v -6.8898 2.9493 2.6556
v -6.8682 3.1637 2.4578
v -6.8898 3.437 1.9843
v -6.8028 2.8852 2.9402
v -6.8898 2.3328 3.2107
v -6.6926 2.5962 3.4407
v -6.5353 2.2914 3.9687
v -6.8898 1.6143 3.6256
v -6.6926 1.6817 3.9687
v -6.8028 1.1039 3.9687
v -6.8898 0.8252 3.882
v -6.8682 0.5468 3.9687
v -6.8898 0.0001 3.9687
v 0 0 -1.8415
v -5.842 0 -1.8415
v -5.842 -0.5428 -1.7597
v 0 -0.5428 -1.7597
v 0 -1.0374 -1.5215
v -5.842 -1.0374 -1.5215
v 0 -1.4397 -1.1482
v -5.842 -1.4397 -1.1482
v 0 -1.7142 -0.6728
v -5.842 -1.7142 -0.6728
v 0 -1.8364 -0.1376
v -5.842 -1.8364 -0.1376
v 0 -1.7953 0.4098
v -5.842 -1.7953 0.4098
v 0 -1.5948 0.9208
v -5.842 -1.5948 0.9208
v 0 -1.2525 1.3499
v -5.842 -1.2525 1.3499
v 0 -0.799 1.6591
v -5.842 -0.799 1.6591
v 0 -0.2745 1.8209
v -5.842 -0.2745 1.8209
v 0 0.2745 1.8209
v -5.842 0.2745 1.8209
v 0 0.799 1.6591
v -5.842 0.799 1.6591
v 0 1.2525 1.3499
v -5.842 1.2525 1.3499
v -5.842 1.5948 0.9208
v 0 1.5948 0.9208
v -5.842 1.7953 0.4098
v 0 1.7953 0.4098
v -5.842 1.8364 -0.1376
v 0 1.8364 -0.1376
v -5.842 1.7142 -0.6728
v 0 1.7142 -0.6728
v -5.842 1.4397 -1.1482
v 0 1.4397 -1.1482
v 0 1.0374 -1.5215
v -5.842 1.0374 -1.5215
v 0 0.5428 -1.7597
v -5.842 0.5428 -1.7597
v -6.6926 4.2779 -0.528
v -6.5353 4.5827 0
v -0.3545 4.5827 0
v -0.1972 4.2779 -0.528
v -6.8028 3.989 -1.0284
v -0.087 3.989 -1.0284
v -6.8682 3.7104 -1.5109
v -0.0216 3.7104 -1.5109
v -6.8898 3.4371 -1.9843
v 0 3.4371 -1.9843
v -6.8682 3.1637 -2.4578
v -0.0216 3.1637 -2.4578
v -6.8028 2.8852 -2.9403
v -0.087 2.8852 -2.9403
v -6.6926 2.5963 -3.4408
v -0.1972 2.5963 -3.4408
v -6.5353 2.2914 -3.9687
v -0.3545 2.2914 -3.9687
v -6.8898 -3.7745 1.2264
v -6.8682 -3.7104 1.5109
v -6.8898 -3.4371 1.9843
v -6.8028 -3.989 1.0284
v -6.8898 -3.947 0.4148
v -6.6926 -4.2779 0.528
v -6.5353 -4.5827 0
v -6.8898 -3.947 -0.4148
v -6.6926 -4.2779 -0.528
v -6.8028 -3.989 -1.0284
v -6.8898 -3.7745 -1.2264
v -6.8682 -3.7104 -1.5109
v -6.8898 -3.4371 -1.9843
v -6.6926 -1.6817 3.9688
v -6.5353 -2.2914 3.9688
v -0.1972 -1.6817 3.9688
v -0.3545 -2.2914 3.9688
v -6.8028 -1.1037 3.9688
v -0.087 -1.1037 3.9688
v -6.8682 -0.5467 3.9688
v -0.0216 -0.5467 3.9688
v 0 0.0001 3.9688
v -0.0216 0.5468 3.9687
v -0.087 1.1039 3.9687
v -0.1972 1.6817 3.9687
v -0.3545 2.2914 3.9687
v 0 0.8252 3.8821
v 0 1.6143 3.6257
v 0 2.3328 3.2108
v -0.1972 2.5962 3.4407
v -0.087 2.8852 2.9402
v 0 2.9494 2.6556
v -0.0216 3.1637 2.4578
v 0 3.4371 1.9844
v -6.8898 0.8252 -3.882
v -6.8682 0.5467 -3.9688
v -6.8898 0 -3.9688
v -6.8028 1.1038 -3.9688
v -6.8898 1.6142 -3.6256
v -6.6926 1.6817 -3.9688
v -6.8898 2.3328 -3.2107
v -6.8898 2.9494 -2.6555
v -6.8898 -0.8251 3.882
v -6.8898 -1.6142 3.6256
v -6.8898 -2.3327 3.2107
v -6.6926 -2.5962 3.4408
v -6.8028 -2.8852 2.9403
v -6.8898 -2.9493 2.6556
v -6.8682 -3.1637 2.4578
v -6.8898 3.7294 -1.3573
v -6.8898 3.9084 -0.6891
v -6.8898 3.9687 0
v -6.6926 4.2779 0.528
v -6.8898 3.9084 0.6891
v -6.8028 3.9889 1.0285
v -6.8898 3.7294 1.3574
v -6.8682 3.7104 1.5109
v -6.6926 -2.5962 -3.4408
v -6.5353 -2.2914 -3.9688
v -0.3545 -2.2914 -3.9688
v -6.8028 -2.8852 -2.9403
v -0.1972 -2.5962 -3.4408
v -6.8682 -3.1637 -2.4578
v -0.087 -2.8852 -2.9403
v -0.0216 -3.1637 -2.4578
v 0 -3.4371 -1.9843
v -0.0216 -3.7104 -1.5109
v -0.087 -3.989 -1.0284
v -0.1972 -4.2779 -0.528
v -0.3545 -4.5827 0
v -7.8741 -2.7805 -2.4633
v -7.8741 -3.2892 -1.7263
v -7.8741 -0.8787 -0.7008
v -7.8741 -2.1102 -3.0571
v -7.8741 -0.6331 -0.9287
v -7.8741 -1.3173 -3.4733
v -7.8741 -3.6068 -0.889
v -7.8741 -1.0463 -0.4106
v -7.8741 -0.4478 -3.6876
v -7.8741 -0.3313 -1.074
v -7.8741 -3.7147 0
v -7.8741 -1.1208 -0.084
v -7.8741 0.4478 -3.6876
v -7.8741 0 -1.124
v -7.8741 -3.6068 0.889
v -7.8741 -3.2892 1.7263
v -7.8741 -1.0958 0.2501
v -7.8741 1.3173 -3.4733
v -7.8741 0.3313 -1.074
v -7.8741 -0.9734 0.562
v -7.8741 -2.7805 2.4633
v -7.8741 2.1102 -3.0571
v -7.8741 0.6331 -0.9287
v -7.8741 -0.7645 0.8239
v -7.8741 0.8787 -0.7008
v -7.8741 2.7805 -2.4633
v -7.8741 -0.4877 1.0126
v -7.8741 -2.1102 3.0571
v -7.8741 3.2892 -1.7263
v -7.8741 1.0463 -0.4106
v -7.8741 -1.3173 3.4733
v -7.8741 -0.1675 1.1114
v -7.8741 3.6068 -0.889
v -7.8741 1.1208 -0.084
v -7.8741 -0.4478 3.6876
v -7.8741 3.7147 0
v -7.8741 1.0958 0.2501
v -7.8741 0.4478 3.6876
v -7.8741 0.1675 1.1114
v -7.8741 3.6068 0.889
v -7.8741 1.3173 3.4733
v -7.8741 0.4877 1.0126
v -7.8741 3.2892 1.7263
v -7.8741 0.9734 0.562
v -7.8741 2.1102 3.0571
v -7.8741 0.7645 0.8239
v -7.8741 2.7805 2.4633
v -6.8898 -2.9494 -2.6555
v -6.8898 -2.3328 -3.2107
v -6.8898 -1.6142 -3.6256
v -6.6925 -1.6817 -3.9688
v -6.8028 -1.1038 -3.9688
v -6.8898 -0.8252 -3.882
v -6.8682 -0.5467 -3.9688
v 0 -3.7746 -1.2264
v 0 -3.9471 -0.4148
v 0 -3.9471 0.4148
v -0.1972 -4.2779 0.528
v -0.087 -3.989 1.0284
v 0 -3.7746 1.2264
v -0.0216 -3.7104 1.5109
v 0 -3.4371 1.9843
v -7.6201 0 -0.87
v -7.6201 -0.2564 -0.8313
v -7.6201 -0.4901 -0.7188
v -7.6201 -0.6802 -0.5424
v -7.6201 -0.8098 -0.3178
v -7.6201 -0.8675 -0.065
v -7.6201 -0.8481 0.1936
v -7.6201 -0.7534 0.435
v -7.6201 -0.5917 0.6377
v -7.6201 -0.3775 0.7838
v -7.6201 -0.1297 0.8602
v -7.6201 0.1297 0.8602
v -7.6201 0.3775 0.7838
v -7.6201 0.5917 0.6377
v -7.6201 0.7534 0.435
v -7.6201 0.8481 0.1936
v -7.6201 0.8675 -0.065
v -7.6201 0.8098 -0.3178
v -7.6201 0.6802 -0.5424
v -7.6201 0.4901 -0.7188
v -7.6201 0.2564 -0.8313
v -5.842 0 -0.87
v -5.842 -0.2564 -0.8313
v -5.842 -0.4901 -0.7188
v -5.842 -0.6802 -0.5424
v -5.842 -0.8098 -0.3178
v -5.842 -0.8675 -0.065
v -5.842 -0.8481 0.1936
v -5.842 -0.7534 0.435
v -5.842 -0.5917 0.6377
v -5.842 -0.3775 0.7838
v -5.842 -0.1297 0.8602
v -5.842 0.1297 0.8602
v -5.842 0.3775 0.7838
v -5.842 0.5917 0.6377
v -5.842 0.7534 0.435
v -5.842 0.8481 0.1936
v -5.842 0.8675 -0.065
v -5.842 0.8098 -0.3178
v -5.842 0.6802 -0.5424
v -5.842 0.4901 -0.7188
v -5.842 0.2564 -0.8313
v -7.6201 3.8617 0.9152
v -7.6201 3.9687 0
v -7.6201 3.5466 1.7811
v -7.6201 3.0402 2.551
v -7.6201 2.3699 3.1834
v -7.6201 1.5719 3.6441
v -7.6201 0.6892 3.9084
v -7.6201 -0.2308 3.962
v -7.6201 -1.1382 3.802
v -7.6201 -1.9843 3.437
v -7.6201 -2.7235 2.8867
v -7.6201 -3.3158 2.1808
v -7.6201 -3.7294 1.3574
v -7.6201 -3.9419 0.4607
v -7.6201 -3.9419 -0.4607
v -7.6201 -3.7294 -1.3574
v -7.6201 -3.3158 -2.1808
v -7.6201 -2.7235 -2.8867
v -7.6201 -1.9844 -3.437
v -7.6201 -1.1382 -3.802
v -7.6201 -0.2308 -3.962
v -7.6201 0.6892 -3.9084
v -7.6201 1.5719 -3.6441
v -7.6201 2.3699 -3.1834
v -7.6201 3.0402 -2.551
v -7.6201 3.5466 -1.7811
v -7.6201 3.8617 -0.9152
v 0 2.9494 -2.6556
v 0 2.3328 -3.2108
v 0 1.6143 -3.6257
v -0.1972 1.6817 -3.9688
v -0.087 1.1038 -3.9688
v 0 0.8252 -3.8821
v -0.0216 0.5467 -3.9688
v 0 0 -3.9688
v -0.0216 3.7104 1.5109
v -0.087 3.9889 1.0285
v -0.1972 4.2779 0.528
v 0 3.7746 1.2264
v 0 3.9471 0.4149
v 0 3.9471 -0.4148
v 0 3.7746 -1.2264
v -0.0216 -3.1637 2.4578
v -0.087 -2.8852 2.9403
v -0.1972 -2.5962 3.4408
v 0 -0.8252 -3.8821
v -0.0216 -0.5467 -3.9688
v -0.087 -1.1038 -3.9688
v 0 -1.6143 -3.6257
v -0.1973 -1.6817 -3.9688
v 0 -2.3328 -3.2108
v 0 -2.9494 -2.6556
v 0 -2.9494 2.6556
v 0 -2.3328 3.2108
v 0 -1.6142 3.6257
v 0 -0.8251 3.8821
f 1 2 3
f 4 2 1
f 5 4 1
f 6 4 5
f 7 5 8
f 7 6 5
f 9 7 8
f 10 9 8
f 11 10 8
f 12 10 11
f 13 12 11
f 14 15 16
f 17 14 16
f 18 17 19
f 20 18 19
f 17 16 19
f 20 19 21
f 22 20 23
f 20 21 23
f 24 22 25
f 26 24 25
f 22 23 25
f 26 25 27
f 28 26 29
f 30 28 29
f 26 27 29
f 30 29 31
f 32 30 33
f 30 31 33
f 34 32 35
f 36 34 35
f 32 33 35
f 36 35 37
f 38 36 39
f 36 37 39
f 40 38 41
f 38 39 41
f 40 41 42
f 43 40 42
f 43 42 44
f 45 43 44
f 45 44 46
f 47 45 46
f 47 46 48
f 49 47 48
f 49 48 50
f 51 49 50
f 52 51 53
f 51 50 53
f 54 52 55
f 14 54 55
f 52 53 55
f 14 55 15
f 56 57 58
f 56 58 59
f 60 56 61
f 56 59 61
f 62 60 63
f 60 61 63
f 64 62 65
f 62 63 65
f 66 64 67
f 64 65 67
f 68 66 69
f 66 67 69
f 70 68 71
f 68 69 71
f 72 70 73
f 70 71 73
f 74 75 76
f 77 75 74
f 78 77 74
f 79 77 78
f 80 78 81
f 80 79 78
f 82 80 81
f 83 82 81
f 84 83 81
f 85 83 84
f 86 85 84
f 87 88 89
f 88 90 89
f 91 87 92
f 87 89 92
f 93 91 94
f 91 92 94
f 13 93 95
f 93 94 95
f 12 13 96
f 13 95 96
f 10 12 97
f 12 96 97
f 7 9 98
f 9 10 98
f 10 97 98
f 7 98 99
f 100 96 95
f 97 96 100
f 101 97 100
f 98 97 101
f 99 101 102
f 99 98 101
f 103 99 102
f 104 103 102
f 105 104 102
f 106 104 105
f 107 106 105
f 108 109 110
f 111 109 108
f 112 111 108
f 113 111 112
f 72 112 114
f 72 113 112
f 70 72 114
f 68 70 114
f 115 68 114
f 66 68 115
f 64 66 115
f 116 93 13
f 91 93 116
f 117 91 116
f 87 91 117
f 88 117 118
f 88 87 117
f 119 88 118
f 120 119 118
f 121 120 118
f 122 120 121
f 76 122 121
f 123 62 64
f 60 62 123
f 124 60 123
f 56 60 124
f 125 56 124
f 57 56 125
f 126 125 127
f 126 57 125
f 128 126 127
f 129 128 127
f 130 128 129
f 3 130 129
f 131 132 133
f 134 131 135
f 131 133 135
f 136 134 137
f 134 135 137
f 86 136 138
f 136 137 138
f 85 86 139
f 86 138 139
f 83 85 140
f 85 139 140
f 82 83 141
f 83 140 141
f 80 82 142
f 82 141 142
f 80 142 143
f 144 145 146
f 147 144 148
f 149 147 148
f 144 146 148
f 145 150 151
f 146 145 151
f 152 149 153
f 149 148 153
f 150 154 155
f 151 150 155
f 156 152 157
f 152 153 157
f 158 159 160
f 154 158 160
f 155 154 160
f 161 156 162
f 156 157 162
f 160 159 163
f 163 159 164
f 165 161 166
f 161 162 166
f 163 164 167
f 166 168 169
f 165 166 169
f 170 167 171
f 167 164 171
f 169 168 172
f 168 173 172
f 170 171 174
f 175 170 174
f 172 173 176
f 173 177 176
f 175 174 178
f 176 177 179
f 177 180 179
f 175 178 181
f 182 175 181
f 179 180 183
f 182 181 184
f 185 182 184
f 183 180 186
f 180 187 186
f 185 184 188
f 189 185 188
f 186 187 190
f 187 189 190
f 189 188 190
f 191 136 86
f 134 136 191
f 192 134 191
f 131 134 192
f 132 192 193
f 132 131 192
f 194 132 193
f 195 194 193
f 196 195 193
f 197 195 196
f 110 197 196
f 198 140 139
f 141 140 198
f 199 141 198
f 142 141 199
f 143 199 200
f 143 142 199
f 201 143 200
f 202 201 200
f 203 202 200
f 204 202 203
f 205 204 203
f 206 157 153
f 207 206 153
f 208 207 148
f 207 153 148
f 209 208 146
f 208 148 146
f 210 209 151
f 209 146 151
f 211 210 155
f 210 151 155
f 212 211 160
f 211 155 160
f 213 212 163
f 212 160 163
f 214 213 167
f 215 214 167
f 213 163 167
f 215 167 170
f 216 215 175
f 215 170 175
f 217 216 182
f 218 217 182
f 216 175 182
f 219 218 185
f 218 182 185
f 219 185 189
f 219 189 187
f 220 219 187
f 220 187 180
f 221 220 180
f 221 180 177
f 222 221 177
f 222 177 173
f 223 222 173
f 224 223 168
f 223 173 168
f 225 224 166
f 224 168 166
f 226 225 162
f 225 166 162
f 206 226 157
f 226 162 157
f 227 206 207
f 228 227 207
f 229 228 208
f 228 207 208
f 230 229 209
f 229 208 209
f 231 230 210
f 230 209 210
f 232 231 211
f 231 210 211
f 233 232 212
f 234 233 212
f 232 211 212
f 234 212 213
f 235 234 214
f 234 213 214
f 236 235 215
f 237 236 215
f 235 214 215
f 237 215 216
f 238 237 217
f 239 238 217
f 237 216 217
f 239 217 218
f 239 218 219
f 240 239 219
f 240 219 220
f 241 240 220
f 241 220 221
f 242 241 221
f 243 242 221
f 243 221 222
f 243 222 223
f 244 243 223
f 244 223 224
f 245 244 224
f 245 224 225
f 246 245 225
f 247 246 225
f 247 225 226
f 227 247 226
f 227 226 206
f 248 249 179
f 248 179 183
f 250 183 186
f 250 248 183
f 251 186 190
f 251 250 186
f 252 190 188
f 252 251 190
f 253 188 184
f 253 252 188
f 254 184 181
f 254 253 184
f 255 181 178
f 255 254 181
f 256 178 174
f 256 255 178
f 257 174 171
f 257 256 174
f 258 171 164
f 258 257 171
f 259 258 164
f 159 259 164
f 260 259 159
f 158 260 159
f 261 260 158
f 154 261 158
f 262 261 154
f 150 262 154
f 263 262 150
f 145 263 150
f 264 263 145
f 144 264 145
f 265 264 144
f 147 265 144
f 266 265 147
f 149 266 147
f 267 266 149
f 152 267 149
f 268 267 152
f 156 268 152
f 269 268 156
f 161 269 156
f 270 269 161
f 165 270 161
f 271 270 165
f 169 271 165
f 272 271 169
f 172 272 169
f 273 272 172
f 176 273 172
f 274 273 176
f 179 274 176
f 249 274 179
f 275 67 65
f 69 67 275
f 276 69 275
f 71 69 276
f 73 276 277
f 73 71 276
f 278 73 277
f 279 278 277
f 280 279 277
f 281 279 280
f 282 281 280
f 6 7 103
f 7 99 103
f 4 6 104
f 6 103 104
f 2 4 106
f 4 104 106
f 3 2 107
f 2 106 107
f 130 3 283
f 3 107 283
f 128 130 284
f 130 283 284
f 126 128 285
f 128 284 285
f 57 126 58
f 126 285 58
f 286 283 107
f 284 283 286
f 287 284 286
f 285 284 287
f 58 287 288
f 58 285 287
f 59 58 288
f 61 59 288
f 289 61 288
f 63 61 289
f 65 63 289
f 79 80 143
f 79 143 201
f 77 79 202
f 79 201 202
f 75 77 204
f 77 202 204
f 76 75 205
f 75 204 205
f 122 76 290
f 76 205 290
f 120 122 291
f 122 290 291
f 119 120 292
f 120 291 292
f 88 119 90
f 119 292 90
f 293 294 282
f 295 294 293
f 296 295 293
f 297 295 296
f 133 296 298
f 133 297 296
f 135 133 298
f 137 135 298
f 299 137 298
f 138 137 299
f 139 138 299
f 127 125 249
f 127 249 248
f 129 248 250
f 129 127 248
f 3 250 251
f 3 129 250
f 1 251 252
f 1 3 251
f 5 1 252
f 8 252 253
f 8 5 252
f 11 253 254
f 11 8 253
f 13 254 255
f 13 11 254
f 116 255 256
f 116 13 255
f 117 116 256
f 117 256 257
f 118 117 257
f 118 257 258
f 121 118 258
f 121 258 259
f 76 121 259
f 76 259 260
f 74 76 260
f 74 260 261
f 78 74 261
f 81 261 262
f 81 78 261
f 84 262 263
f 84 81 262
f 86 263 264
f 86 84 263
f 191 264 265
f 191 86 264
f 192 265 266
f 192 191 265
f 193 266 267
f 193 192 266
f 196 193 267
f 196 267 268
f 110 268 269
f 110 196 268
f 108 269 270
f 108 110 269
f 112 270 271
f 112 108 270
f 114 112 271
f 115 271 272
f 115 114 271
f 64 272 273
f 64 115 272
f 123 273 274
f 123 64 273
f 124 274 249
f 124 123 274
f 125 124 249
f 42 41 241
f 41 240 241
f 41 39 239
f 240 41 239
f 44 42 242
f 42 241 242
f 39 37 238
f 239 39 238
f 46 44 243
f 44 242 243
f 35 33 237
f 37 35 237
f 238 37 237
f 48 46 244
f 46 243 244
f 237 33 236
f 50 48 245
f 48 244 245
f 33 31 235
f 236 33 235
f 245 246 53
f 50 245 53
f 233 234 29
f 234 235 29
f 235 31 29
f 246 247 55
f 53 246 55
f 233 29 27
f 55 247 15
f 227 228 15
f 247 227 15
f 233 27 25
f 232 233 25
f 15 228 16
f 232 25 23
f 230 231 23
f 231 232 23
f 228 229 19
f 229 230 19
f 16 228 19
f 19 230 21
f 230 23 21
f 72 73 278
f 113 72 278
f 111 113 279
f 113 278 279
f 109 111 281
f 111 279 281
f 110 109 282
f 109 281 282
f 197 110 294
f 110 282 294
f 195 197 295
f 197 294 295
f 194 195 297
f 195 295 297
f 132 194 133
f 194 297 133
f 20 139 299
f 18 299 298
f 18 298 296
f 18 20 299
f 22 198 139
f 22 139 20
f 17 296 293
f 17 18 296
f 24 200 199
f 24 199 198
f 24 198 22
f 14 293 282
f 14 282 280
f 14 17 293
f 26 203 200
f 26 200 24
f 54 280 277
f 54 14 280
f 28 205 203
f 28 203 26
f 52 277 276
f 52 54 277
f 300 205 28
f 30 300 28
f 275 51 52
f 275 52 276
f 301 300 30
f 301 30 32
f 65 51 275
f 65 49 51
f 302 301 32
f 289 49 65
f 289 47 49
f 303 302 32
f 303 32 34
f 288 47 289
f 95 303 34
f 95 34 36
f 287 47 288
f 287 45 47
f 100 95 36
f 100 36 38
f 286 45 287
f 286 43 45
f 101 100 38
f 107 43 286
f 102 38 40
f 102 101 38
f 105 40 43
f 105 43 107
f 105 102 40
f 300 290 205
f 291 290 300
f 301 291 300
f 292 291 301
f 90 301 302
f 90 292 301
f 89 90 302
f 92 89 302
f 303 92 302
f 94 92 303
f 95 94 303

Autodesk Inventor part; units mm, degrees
ref_plane "YZ Plane" through (0, 0, 0) normal (1, 0, 0) x (0, 1, 0)
sketch "Sketch1: Hex" plane through (0, 0, 0) normal (1, 0, 0) x (0, 1, 0)
  line L0 (-2.2914, 3.9688) -> (2.2914, 3.9687)
  line L1 (2.2914, 3.9687) -> (4.5827, 0)
  line L2 (4.5827, 0) -> (2.2914, -3.9688)
  line L3 (2.2914, -3.9688) -> (-2.2914, -3.9688)
  line L4 (-2.2914, -3.9688) -> (-4.5827, 0)
  line L5 (-4.5827, 0) -> (-2.2914, 3.9688)
  circle A0 centre (0, 0) radius 0.87
  point P0 (0, 3.9687)
  point P1 (0, -3.9688)
  dimension "hex_angle" = 120
  dimension "hex_size" = 7.9375
  dimension "d1" = 1.7399
extrude "Ex: Hex" add sketch "Sketch1: Hex" against normal blind 6.8898 contours L0 L1 L2 L3 L4 L5 | A0
hole "Hole: Tap" [suppressed]
hole "Hole: Thread" at (0, 0, 0) direction (-1, 0, 0) diameter 3.683 depth 5.842 thread size "10-24 UNC" class "2B" standard "ANSI Unified Screw Threads"
sketch "Sketch2: Top" plane through (-6.8898, 0, 0) normal (1, 0, 0) x (0, 1, 0)
  circle A0 centre (0, 0) radius 3.9687
  circle A1 centre (0, 0) radius 3.7147
  dimension "d4" = 7.9375
  dimension "d5" = 7.4295
extrude "Ex: Top" add sketch "Sketch2: Top" against normal blind 0.9843 contours A0 | A1
hole "Hole: Tubing" at (0, 0, 0) direction (-1, 0, 0) diameter 1.7399 end through all
chamfer "Chamfer1: Top (side)" distance 0.254 angle 45 1 edges at (-7.874, -3.9687, 0)
chamfer "Chamfer2: Top (hole)" distance 0.254 angle 45 1 edges at (-7.874, 0, 0.87)
sketch "Sketch3: Reference: Nut Chamfer" plane through (0, 0, 0) normal (1, 0, 0) x (0, 0, -1)
  circle A0 centre (0, 0) radius 3.9688
  line L0 (3.9688, 2.2914) -> (0, 4.5827) projected
ref_plane "Work Plane1" through (0, 2.2914, -3.9688) normal (0, 0.8660254, 0.5) x (-1, 0, 0)
sketch "Sketch4: Chamfer (nut)" plane through (0, 0, 0) normal (0, 0.8660254, 0.5) x (-1, 0, 0)
  line L0 (0, -3.9688) -> (0, -4.5827)
  line L1 (0, -4.5827) -> (0.3545, -4.5827)
  line L2 (0.3545, -4.5827) -> (0, -3.9688)
  line L3 (0, 3.9688) -> (0, -3.9688) projected
  line L4 (8.2677, 0) -> (-1.378, 0) projected
  line L5 (0, -4.5827) -> (6.8898, -4.5827) projected
  point P0 (0, 0)
  dimension "chamfer_angle" = 30
revolve "Revolution: Chamfer (nut)" cut sketch "Sketch4: Chamfer (nut)" angle 360 about axis through (-10, 0, 0) along (1, 0, 0)
ref_plane "Work Plane2: Hex Center" through (-3.4449, 0, 0) normal (1, 0, 0) x (0, 0, -1)
mirror "Mirror: Chamfer (nut)" about plane through (-3.4449, 0, 0) normal (1, 0, 0) of "Revolution: Chamfer (nut)"
properties part number "Nut for Precision Compression Fitting"
